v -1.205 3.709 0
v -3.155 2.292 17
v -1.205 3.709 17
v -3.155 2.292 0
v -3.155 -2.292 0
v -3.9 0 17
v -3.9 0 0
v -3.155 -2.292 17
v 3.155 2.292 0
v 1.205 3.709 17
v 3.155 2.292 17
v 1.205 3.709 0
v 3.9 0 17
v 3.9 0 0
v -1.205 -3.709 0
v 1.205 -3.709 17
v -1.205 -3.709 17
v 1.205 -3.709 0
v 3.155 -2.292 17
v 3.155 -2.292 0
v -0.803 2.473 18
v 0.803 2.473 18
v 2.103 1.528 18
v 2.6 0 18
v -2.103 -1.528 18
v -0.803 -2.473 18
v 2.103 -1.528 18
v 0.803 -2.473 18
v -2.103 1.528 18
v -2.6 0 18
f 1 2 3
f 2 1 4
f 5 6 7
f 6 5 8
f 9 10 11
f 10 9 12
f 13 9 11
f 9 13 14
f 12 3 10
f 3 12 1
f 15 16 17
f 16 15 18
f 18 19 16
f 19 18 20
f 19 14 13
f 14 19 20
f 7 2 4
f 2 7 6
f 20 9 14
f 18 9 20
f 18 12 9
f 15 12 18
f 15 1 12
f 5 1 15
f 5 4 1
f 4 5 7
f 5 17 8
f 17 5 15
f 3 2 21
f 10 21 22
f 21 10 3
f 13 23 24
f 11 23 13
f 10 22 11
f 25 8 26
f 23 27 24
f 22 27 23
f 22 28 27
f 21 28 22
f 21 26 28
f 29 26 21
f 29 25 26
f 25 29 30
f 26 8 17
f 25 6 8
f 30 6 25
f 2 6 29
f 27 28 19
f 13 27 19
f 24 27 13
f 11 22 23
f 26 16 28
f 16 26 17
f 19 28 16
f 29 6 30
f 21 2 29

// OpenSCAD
$fn = 10;

h = 17;
d = 7.8;

cylinder(h, d/2, d/2); 
translate([0,0,h])
   cylinder(1, d/2, d/3); 
